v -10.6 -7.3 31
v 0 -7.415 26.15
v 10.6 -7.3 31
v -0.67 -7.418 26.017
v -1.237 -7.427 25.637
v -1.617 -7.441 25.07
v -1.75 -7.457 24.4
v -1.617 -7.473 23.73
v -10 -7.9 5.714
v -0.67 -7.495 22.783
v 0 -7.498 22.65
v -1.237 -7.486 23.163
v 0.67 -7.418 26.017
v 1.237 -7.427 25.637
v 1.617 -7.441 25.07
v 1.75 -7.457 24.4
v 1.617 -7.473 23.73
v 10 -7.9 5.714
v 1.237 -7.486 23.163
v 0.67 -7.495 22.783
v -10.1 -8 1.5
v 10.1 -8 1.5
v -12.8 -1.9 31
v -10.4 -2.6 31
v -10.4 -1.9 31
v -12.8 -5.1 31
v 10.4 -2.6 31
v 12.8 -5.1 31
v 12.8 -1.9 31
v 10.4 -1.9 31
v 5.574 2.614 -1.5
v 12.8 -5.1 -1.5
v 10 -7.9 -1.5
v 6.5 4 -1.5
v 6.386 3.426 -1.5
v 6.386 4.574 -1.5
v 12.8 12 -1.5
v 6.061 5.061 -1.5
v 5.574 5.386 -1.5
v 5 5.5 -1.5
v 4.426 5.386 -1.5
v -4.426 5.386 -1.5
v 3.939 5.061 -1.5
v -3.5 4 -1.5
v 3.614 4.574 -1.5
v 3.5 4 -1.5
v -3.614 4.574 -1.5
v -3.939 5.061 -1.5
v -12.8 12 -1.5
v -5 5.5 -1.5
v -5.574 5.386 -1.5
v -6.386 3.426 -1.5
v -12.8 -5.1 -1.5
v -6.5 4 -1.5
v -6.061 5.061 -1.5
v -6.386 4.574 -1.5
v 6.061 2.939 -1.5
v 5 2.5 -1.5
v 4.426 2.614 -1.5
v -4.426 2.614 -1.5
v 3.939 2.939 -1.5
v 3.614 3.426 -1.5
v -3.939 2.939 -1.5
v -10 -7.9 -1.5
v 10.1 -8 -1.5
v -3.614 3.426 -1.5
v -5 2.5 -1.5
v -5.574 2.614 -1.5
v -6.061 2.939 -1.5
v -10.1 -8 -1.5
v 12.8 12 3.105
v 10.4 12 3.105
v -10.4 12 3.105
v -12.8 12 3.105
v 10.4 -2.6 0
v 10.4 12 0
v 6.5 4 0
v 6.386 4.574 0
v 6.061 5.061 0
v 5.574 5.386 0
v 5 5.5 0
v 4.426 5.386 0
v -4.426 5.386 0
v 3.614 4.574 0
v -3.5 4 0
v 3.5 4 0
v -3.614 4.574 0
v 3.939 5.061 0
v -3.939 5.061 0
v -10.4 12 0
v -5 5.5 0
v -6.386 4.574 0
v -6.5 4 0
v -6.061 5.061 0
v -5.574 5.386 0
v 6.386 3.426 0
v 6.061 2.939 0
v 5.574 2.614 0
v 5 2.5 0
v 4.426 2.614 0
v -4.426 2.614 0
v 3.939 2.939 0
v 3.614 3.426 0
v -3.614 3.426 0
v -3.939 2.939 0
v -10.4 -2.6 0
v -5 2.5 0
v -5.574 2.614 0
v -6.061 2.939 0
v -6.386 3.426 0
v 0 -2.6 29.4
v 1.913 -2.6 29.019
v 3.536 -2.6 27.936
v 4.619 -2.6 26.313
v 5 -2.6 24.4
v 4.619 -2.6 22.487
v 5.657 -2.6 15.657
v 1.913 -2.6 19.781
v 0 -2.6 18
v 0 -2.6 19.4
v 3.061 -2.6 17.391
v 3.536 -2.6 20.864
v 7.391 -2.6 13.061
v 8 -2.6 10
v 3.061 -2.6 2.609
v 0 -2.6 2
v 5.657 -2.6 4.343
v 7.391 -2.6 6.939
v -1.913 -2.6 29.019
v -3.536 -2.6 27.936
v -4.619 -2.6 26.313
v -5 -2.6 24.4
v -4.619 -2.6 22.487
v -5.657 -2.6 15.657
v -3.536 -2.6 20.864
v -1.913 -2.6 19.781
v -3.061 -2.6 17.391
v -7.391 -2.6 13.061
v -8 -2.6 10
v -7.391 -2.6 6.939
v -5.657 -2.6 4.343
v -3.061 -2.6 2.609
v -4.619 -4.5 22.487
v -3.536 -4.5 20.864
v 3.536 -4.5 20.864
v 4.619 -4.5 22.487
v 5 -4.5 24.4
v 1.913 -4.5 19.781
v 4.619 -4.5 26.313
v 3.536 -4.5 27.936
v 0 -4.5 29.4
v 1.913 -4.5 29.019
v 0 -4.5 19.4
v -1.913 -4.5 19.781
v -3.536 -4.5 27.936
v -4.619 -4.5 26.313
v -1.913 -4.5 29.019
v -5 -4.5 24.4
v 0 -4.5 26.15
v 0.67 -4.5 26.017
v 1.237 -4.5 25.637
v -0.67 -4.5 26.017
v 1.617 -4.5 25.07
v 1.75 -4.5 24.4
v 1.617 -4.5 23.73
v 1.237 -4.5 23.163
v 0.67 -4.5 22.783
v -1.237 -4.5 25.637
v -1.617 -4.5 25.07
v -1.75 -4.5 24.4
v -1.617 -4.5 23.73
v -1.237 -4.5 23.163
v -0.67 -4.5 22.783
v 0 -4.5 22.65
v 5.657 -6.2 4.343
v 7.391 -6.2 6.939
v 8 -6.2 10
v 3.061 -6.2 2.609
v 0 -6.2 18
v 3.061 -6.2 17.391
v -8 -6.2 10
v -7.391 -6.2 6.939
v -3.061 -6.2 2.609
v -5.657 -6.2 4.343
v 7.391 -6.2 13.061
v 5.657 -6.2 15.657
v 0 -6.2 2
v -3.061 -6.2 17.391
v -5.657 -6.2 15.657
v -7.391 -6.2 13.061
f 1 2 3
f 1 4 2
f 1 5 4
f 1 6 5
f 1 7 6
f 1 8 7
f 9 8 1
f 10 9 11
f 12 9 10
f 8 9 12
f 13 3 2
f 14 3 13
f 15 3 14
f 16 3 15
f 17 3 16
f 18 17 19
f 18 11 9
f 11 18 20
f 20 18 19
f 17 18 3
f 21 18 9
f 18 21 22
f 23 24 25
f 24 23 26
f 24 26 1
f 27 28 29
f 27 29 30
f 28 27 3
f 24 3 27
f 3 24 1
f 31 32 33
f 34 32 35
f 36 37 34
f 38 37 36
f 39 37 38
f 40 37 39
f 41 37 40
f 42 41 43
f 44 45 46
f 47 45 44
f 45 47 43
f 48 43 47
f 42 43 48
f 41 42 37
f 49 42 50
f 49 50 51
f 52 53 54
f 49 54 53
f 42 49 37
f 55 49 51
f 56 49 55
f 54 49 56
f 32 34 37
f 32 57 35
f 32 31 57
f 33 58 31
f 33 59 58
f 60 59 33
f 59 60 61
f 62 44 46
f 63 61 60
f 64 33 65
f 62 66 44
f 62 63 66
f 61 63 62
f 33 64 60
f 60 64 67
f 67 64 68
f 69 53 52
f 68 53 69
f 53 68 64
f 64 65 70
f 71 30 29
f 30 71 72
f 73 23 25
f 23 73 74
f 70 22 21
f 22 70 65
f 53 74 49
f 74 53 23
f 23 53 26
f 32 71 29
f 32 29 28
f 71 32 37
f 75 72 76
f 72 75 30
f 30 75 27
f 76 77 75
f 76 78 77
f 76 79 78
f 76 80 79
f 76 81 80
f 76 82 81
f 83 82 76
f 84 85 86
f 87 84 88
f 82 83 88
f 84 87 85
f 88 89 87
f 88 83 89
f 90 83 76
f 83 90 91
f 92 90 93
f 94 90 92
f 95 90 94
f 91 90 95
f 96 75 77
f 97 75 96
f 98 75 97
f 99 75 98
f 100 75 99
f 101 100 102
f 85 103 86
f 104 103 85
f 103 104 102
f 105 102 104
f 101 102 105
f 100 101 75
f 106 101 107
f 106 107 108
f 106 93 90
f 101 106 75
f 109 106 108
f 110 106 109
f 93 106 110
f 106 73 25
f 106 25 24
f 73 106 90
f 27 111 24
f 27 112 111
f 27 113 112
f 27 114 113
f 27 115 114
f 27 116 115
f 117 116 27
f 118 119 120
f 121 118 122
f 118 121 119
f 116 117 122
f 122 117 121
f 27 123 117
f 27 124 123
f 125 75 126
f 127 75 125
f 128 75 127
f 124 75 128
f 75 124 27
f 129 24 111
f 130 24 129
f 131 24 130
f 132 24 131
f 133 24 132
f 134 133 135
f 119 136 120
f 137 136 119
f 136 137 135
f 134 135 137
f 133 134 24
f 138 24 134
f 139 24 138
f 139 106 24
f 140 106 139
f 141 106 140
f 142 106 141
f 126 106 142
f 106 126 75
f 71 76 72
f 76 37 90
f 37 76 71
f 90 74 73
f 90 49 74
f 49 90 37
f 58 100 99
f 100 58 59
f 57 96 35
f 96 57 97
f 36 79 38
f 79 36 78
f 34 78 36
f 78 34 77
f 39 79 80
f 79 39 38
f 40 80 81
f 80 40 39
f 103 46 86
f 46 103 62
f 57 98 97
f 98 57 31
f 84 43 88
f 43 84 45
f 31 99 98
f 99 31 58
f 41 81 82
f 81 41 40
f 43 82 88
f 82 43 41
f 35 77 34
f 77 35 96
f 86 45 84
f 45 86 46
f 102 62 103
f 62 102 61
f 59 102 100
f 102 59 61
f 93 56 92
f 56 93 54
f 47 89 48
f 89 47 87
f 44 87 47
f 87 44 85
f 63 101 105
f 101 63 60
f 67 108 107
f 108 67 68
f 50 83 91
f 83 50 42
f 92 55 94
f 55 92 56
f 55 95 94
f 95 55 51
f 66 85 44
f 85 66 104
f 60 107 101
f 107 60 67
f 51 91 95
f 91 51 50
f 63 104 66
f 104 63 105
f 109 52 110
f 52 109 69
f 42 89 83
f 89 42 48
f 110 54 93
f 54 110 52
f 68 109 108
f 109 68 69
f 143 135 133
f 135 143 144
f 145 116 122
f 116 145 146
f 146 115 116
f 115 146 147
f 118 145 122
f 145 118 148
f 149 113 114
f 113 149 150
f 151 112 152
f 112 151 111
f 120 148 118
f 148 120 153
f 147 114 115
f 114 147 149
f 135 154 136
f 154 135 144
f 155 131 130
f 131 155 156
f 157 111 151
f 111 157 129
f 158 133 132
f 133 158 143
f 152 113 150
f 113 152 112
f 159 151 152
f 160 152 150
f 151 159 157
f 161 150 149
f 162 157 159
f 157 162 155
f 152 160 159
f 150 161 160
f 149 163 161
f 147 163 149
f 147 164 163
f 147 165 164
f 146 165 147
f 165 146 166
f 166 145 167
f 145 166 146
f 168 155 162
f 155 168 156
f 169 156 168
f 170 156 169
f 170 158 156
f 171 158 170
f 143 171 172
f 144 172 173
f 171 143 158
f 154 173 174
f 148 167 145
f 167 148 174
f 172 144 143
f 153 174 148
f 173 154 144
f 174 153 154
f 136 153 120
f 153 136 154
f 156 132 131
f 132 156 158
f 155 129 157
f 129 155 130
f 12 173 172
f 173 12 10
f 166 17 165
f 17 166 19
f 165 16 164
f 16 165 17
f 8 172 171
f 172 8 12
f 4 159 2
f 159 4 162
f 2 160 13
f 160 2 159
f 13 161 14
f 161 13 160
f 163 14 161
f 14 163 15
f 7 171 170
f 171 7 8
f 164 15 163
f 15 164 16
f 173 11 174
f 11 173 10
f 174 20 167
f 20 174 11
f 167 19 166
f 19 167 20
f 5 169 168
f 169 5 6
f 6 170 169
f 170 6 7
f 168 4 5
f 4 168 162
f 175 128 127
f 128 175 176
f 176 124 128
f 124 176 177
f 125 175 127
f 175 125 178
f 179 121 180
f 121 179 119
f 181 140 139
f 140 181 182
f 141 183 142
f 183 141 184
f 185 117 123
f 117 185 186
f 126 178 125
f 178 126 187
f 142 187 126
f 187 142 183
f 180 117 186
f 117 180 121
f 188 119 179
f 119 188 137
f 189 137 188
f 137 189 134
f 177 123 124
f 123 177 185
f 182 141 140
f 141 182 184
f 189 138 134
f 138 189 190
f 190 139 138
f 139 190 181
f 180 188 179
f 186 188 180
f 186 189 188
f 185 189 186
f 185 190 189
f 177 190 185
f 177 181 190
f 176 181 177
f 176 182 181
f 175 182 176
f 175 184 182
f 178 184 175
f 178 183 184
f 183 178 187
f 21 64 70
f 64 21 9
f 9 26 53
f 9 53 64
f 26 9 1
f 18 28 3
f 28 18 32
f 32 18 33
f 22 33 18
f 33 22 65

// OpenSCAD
/* rail */
$width = 20;
$height = 15;
$thickness = 2;
$tol = 0.4;
$wallth = 4*0.6;
$wireout = 24;

module rail(filled = false)
{
    translate([0,$height/2-$thickness-$tol,25])
    difference()
    {
        cube([$width+2*$tol, $height+$tol, 50], center = true);
        if(filled == false)
            translate([0, $thickness/2+$tol/2, 0])
                cube([$width-2*$thickness-2*$tol, $height-$thickness-$tol+0.1, 50], center = true);  
    }
}

module inner()
{
    difference()
    {
        union()
        {
    //        translate([0,-$wallth/2+$height/2-$thickness-$tol,1.5])
    //            cube([$width+2*$tol + 2*$wallth, $height+$tol+$wallth, 3], center=true);

            translate([-$width/2+$thickness+$tol,-$tol/2,0])
                cube([$width-2*$thickness-2*$tol, $height-$thickness, 20]);
            
            translate([-$width/2,-$tol/2,0])
                cube([$width, $height/2-$thickness, 30]);
        }
        
        translate([0,0, 0])
            rail();

            //ceiling
        translate([0,-1,10])
            rotate(a=90, v=[-1,0,0])
                cylinder(r=3, h=20, $fn=16);
        
        //wire
        translate([0,-1,$wireout])
            rotate(a=90, v=[-1,0,0])
                cylinder(r=3/2, h=20, $fn=16);
        translate([0,$height/5,$wireout])
            rotate(a=90, v=[-1,0,0])
                cylinder(r1=3/2, r2=3, h=$height/6, $fn=16);
        translate([$width/4, 3.8, 0])
            cylinder(r=2.5/2, h=10, $fn=16);
        translate([-$width/4, 3.8, 0])
            cylinder(r=2.5/2, h=10, $fn=16);
        translate([-$width/2+$thickness+2,-$tol,0])
            rotate(a=45+90, v=[0,0,1])
                cube([4,4,50]);
        translate([$width/2-$thickness-2,-$tol,0])
            rotate(a=-45, v=[0,0,1])
                cube([4,4,50]);
    }

    //nose
    difference()
    {
        translate([0,-4,$wireout])
            rotate(a=90, v=[-1,0,0])
                cylinder(r=4, h=5, $fn=16);
        translate([0,-5,$wireout])
            rotate(a=90, v=[-1,0,0])
                cylinder(r=3/2, h=20, $fn=16);
    }
}

module outer()
{
    difference()
    {
        hull()
        {
            translate([0,-$wallth/2+$height/2-$thickness-$tol-3/2,1.5-1.5])
                cube([$width+2*$tol + 2*$wallth, $height+$tol+$wallth+3, 3], center=true);
            translate([-($width+2*$tol)/2 - $wallth,-2.5 -2*$wallth,28])
                cube([$width+2*$tol + 2*$wallth, 3+$wallth, 3]);

        }
        
        translate([0,0, 0])
            rail(true);
        
        translate([-$width, $height-$thickness-1, -3])
            cube([$width*2, 10, 20]);

            //fix
        translate([$width/4, 4, -5])
            cylinder(r=3/2, h=10, $fn=16);
        translate([-$width/4, 4, -5])
            cylinder(r=3/2, h=10, $fn=16);

            //nose
        translate([0,-4.5,$wireout+0.4])
            rotate(a=90, v=[-1,0,0])
                cylinder(r=5, h=5, $fn=16);
        translate([0,-10,$wireout+0.4])
            rotate(a=90, v=[-1,0,0])
                cylinder(r=3.5/2, h=10, $fn=16);
        
        //ceiling
        translate([0,-$thickness-3-$wallth/2,10])
            rotate(a=90, v=[-1,0,0])
                cylinder(r=8, h=20, $fn=16);
                
        translate([-$width/2-$thickness+2,-$tol-7.5,-2])
            rotate(a=45+90, v=[0,0,1])
                cube([4,4,50]);
        translate([$width/2+$thickness-2,-$tol-7.5,-2])
            rotate(a=-45, v=[0,0,1])
                cube([4,4,50]);
    }
}

//inner();
outer();

//#rail();
